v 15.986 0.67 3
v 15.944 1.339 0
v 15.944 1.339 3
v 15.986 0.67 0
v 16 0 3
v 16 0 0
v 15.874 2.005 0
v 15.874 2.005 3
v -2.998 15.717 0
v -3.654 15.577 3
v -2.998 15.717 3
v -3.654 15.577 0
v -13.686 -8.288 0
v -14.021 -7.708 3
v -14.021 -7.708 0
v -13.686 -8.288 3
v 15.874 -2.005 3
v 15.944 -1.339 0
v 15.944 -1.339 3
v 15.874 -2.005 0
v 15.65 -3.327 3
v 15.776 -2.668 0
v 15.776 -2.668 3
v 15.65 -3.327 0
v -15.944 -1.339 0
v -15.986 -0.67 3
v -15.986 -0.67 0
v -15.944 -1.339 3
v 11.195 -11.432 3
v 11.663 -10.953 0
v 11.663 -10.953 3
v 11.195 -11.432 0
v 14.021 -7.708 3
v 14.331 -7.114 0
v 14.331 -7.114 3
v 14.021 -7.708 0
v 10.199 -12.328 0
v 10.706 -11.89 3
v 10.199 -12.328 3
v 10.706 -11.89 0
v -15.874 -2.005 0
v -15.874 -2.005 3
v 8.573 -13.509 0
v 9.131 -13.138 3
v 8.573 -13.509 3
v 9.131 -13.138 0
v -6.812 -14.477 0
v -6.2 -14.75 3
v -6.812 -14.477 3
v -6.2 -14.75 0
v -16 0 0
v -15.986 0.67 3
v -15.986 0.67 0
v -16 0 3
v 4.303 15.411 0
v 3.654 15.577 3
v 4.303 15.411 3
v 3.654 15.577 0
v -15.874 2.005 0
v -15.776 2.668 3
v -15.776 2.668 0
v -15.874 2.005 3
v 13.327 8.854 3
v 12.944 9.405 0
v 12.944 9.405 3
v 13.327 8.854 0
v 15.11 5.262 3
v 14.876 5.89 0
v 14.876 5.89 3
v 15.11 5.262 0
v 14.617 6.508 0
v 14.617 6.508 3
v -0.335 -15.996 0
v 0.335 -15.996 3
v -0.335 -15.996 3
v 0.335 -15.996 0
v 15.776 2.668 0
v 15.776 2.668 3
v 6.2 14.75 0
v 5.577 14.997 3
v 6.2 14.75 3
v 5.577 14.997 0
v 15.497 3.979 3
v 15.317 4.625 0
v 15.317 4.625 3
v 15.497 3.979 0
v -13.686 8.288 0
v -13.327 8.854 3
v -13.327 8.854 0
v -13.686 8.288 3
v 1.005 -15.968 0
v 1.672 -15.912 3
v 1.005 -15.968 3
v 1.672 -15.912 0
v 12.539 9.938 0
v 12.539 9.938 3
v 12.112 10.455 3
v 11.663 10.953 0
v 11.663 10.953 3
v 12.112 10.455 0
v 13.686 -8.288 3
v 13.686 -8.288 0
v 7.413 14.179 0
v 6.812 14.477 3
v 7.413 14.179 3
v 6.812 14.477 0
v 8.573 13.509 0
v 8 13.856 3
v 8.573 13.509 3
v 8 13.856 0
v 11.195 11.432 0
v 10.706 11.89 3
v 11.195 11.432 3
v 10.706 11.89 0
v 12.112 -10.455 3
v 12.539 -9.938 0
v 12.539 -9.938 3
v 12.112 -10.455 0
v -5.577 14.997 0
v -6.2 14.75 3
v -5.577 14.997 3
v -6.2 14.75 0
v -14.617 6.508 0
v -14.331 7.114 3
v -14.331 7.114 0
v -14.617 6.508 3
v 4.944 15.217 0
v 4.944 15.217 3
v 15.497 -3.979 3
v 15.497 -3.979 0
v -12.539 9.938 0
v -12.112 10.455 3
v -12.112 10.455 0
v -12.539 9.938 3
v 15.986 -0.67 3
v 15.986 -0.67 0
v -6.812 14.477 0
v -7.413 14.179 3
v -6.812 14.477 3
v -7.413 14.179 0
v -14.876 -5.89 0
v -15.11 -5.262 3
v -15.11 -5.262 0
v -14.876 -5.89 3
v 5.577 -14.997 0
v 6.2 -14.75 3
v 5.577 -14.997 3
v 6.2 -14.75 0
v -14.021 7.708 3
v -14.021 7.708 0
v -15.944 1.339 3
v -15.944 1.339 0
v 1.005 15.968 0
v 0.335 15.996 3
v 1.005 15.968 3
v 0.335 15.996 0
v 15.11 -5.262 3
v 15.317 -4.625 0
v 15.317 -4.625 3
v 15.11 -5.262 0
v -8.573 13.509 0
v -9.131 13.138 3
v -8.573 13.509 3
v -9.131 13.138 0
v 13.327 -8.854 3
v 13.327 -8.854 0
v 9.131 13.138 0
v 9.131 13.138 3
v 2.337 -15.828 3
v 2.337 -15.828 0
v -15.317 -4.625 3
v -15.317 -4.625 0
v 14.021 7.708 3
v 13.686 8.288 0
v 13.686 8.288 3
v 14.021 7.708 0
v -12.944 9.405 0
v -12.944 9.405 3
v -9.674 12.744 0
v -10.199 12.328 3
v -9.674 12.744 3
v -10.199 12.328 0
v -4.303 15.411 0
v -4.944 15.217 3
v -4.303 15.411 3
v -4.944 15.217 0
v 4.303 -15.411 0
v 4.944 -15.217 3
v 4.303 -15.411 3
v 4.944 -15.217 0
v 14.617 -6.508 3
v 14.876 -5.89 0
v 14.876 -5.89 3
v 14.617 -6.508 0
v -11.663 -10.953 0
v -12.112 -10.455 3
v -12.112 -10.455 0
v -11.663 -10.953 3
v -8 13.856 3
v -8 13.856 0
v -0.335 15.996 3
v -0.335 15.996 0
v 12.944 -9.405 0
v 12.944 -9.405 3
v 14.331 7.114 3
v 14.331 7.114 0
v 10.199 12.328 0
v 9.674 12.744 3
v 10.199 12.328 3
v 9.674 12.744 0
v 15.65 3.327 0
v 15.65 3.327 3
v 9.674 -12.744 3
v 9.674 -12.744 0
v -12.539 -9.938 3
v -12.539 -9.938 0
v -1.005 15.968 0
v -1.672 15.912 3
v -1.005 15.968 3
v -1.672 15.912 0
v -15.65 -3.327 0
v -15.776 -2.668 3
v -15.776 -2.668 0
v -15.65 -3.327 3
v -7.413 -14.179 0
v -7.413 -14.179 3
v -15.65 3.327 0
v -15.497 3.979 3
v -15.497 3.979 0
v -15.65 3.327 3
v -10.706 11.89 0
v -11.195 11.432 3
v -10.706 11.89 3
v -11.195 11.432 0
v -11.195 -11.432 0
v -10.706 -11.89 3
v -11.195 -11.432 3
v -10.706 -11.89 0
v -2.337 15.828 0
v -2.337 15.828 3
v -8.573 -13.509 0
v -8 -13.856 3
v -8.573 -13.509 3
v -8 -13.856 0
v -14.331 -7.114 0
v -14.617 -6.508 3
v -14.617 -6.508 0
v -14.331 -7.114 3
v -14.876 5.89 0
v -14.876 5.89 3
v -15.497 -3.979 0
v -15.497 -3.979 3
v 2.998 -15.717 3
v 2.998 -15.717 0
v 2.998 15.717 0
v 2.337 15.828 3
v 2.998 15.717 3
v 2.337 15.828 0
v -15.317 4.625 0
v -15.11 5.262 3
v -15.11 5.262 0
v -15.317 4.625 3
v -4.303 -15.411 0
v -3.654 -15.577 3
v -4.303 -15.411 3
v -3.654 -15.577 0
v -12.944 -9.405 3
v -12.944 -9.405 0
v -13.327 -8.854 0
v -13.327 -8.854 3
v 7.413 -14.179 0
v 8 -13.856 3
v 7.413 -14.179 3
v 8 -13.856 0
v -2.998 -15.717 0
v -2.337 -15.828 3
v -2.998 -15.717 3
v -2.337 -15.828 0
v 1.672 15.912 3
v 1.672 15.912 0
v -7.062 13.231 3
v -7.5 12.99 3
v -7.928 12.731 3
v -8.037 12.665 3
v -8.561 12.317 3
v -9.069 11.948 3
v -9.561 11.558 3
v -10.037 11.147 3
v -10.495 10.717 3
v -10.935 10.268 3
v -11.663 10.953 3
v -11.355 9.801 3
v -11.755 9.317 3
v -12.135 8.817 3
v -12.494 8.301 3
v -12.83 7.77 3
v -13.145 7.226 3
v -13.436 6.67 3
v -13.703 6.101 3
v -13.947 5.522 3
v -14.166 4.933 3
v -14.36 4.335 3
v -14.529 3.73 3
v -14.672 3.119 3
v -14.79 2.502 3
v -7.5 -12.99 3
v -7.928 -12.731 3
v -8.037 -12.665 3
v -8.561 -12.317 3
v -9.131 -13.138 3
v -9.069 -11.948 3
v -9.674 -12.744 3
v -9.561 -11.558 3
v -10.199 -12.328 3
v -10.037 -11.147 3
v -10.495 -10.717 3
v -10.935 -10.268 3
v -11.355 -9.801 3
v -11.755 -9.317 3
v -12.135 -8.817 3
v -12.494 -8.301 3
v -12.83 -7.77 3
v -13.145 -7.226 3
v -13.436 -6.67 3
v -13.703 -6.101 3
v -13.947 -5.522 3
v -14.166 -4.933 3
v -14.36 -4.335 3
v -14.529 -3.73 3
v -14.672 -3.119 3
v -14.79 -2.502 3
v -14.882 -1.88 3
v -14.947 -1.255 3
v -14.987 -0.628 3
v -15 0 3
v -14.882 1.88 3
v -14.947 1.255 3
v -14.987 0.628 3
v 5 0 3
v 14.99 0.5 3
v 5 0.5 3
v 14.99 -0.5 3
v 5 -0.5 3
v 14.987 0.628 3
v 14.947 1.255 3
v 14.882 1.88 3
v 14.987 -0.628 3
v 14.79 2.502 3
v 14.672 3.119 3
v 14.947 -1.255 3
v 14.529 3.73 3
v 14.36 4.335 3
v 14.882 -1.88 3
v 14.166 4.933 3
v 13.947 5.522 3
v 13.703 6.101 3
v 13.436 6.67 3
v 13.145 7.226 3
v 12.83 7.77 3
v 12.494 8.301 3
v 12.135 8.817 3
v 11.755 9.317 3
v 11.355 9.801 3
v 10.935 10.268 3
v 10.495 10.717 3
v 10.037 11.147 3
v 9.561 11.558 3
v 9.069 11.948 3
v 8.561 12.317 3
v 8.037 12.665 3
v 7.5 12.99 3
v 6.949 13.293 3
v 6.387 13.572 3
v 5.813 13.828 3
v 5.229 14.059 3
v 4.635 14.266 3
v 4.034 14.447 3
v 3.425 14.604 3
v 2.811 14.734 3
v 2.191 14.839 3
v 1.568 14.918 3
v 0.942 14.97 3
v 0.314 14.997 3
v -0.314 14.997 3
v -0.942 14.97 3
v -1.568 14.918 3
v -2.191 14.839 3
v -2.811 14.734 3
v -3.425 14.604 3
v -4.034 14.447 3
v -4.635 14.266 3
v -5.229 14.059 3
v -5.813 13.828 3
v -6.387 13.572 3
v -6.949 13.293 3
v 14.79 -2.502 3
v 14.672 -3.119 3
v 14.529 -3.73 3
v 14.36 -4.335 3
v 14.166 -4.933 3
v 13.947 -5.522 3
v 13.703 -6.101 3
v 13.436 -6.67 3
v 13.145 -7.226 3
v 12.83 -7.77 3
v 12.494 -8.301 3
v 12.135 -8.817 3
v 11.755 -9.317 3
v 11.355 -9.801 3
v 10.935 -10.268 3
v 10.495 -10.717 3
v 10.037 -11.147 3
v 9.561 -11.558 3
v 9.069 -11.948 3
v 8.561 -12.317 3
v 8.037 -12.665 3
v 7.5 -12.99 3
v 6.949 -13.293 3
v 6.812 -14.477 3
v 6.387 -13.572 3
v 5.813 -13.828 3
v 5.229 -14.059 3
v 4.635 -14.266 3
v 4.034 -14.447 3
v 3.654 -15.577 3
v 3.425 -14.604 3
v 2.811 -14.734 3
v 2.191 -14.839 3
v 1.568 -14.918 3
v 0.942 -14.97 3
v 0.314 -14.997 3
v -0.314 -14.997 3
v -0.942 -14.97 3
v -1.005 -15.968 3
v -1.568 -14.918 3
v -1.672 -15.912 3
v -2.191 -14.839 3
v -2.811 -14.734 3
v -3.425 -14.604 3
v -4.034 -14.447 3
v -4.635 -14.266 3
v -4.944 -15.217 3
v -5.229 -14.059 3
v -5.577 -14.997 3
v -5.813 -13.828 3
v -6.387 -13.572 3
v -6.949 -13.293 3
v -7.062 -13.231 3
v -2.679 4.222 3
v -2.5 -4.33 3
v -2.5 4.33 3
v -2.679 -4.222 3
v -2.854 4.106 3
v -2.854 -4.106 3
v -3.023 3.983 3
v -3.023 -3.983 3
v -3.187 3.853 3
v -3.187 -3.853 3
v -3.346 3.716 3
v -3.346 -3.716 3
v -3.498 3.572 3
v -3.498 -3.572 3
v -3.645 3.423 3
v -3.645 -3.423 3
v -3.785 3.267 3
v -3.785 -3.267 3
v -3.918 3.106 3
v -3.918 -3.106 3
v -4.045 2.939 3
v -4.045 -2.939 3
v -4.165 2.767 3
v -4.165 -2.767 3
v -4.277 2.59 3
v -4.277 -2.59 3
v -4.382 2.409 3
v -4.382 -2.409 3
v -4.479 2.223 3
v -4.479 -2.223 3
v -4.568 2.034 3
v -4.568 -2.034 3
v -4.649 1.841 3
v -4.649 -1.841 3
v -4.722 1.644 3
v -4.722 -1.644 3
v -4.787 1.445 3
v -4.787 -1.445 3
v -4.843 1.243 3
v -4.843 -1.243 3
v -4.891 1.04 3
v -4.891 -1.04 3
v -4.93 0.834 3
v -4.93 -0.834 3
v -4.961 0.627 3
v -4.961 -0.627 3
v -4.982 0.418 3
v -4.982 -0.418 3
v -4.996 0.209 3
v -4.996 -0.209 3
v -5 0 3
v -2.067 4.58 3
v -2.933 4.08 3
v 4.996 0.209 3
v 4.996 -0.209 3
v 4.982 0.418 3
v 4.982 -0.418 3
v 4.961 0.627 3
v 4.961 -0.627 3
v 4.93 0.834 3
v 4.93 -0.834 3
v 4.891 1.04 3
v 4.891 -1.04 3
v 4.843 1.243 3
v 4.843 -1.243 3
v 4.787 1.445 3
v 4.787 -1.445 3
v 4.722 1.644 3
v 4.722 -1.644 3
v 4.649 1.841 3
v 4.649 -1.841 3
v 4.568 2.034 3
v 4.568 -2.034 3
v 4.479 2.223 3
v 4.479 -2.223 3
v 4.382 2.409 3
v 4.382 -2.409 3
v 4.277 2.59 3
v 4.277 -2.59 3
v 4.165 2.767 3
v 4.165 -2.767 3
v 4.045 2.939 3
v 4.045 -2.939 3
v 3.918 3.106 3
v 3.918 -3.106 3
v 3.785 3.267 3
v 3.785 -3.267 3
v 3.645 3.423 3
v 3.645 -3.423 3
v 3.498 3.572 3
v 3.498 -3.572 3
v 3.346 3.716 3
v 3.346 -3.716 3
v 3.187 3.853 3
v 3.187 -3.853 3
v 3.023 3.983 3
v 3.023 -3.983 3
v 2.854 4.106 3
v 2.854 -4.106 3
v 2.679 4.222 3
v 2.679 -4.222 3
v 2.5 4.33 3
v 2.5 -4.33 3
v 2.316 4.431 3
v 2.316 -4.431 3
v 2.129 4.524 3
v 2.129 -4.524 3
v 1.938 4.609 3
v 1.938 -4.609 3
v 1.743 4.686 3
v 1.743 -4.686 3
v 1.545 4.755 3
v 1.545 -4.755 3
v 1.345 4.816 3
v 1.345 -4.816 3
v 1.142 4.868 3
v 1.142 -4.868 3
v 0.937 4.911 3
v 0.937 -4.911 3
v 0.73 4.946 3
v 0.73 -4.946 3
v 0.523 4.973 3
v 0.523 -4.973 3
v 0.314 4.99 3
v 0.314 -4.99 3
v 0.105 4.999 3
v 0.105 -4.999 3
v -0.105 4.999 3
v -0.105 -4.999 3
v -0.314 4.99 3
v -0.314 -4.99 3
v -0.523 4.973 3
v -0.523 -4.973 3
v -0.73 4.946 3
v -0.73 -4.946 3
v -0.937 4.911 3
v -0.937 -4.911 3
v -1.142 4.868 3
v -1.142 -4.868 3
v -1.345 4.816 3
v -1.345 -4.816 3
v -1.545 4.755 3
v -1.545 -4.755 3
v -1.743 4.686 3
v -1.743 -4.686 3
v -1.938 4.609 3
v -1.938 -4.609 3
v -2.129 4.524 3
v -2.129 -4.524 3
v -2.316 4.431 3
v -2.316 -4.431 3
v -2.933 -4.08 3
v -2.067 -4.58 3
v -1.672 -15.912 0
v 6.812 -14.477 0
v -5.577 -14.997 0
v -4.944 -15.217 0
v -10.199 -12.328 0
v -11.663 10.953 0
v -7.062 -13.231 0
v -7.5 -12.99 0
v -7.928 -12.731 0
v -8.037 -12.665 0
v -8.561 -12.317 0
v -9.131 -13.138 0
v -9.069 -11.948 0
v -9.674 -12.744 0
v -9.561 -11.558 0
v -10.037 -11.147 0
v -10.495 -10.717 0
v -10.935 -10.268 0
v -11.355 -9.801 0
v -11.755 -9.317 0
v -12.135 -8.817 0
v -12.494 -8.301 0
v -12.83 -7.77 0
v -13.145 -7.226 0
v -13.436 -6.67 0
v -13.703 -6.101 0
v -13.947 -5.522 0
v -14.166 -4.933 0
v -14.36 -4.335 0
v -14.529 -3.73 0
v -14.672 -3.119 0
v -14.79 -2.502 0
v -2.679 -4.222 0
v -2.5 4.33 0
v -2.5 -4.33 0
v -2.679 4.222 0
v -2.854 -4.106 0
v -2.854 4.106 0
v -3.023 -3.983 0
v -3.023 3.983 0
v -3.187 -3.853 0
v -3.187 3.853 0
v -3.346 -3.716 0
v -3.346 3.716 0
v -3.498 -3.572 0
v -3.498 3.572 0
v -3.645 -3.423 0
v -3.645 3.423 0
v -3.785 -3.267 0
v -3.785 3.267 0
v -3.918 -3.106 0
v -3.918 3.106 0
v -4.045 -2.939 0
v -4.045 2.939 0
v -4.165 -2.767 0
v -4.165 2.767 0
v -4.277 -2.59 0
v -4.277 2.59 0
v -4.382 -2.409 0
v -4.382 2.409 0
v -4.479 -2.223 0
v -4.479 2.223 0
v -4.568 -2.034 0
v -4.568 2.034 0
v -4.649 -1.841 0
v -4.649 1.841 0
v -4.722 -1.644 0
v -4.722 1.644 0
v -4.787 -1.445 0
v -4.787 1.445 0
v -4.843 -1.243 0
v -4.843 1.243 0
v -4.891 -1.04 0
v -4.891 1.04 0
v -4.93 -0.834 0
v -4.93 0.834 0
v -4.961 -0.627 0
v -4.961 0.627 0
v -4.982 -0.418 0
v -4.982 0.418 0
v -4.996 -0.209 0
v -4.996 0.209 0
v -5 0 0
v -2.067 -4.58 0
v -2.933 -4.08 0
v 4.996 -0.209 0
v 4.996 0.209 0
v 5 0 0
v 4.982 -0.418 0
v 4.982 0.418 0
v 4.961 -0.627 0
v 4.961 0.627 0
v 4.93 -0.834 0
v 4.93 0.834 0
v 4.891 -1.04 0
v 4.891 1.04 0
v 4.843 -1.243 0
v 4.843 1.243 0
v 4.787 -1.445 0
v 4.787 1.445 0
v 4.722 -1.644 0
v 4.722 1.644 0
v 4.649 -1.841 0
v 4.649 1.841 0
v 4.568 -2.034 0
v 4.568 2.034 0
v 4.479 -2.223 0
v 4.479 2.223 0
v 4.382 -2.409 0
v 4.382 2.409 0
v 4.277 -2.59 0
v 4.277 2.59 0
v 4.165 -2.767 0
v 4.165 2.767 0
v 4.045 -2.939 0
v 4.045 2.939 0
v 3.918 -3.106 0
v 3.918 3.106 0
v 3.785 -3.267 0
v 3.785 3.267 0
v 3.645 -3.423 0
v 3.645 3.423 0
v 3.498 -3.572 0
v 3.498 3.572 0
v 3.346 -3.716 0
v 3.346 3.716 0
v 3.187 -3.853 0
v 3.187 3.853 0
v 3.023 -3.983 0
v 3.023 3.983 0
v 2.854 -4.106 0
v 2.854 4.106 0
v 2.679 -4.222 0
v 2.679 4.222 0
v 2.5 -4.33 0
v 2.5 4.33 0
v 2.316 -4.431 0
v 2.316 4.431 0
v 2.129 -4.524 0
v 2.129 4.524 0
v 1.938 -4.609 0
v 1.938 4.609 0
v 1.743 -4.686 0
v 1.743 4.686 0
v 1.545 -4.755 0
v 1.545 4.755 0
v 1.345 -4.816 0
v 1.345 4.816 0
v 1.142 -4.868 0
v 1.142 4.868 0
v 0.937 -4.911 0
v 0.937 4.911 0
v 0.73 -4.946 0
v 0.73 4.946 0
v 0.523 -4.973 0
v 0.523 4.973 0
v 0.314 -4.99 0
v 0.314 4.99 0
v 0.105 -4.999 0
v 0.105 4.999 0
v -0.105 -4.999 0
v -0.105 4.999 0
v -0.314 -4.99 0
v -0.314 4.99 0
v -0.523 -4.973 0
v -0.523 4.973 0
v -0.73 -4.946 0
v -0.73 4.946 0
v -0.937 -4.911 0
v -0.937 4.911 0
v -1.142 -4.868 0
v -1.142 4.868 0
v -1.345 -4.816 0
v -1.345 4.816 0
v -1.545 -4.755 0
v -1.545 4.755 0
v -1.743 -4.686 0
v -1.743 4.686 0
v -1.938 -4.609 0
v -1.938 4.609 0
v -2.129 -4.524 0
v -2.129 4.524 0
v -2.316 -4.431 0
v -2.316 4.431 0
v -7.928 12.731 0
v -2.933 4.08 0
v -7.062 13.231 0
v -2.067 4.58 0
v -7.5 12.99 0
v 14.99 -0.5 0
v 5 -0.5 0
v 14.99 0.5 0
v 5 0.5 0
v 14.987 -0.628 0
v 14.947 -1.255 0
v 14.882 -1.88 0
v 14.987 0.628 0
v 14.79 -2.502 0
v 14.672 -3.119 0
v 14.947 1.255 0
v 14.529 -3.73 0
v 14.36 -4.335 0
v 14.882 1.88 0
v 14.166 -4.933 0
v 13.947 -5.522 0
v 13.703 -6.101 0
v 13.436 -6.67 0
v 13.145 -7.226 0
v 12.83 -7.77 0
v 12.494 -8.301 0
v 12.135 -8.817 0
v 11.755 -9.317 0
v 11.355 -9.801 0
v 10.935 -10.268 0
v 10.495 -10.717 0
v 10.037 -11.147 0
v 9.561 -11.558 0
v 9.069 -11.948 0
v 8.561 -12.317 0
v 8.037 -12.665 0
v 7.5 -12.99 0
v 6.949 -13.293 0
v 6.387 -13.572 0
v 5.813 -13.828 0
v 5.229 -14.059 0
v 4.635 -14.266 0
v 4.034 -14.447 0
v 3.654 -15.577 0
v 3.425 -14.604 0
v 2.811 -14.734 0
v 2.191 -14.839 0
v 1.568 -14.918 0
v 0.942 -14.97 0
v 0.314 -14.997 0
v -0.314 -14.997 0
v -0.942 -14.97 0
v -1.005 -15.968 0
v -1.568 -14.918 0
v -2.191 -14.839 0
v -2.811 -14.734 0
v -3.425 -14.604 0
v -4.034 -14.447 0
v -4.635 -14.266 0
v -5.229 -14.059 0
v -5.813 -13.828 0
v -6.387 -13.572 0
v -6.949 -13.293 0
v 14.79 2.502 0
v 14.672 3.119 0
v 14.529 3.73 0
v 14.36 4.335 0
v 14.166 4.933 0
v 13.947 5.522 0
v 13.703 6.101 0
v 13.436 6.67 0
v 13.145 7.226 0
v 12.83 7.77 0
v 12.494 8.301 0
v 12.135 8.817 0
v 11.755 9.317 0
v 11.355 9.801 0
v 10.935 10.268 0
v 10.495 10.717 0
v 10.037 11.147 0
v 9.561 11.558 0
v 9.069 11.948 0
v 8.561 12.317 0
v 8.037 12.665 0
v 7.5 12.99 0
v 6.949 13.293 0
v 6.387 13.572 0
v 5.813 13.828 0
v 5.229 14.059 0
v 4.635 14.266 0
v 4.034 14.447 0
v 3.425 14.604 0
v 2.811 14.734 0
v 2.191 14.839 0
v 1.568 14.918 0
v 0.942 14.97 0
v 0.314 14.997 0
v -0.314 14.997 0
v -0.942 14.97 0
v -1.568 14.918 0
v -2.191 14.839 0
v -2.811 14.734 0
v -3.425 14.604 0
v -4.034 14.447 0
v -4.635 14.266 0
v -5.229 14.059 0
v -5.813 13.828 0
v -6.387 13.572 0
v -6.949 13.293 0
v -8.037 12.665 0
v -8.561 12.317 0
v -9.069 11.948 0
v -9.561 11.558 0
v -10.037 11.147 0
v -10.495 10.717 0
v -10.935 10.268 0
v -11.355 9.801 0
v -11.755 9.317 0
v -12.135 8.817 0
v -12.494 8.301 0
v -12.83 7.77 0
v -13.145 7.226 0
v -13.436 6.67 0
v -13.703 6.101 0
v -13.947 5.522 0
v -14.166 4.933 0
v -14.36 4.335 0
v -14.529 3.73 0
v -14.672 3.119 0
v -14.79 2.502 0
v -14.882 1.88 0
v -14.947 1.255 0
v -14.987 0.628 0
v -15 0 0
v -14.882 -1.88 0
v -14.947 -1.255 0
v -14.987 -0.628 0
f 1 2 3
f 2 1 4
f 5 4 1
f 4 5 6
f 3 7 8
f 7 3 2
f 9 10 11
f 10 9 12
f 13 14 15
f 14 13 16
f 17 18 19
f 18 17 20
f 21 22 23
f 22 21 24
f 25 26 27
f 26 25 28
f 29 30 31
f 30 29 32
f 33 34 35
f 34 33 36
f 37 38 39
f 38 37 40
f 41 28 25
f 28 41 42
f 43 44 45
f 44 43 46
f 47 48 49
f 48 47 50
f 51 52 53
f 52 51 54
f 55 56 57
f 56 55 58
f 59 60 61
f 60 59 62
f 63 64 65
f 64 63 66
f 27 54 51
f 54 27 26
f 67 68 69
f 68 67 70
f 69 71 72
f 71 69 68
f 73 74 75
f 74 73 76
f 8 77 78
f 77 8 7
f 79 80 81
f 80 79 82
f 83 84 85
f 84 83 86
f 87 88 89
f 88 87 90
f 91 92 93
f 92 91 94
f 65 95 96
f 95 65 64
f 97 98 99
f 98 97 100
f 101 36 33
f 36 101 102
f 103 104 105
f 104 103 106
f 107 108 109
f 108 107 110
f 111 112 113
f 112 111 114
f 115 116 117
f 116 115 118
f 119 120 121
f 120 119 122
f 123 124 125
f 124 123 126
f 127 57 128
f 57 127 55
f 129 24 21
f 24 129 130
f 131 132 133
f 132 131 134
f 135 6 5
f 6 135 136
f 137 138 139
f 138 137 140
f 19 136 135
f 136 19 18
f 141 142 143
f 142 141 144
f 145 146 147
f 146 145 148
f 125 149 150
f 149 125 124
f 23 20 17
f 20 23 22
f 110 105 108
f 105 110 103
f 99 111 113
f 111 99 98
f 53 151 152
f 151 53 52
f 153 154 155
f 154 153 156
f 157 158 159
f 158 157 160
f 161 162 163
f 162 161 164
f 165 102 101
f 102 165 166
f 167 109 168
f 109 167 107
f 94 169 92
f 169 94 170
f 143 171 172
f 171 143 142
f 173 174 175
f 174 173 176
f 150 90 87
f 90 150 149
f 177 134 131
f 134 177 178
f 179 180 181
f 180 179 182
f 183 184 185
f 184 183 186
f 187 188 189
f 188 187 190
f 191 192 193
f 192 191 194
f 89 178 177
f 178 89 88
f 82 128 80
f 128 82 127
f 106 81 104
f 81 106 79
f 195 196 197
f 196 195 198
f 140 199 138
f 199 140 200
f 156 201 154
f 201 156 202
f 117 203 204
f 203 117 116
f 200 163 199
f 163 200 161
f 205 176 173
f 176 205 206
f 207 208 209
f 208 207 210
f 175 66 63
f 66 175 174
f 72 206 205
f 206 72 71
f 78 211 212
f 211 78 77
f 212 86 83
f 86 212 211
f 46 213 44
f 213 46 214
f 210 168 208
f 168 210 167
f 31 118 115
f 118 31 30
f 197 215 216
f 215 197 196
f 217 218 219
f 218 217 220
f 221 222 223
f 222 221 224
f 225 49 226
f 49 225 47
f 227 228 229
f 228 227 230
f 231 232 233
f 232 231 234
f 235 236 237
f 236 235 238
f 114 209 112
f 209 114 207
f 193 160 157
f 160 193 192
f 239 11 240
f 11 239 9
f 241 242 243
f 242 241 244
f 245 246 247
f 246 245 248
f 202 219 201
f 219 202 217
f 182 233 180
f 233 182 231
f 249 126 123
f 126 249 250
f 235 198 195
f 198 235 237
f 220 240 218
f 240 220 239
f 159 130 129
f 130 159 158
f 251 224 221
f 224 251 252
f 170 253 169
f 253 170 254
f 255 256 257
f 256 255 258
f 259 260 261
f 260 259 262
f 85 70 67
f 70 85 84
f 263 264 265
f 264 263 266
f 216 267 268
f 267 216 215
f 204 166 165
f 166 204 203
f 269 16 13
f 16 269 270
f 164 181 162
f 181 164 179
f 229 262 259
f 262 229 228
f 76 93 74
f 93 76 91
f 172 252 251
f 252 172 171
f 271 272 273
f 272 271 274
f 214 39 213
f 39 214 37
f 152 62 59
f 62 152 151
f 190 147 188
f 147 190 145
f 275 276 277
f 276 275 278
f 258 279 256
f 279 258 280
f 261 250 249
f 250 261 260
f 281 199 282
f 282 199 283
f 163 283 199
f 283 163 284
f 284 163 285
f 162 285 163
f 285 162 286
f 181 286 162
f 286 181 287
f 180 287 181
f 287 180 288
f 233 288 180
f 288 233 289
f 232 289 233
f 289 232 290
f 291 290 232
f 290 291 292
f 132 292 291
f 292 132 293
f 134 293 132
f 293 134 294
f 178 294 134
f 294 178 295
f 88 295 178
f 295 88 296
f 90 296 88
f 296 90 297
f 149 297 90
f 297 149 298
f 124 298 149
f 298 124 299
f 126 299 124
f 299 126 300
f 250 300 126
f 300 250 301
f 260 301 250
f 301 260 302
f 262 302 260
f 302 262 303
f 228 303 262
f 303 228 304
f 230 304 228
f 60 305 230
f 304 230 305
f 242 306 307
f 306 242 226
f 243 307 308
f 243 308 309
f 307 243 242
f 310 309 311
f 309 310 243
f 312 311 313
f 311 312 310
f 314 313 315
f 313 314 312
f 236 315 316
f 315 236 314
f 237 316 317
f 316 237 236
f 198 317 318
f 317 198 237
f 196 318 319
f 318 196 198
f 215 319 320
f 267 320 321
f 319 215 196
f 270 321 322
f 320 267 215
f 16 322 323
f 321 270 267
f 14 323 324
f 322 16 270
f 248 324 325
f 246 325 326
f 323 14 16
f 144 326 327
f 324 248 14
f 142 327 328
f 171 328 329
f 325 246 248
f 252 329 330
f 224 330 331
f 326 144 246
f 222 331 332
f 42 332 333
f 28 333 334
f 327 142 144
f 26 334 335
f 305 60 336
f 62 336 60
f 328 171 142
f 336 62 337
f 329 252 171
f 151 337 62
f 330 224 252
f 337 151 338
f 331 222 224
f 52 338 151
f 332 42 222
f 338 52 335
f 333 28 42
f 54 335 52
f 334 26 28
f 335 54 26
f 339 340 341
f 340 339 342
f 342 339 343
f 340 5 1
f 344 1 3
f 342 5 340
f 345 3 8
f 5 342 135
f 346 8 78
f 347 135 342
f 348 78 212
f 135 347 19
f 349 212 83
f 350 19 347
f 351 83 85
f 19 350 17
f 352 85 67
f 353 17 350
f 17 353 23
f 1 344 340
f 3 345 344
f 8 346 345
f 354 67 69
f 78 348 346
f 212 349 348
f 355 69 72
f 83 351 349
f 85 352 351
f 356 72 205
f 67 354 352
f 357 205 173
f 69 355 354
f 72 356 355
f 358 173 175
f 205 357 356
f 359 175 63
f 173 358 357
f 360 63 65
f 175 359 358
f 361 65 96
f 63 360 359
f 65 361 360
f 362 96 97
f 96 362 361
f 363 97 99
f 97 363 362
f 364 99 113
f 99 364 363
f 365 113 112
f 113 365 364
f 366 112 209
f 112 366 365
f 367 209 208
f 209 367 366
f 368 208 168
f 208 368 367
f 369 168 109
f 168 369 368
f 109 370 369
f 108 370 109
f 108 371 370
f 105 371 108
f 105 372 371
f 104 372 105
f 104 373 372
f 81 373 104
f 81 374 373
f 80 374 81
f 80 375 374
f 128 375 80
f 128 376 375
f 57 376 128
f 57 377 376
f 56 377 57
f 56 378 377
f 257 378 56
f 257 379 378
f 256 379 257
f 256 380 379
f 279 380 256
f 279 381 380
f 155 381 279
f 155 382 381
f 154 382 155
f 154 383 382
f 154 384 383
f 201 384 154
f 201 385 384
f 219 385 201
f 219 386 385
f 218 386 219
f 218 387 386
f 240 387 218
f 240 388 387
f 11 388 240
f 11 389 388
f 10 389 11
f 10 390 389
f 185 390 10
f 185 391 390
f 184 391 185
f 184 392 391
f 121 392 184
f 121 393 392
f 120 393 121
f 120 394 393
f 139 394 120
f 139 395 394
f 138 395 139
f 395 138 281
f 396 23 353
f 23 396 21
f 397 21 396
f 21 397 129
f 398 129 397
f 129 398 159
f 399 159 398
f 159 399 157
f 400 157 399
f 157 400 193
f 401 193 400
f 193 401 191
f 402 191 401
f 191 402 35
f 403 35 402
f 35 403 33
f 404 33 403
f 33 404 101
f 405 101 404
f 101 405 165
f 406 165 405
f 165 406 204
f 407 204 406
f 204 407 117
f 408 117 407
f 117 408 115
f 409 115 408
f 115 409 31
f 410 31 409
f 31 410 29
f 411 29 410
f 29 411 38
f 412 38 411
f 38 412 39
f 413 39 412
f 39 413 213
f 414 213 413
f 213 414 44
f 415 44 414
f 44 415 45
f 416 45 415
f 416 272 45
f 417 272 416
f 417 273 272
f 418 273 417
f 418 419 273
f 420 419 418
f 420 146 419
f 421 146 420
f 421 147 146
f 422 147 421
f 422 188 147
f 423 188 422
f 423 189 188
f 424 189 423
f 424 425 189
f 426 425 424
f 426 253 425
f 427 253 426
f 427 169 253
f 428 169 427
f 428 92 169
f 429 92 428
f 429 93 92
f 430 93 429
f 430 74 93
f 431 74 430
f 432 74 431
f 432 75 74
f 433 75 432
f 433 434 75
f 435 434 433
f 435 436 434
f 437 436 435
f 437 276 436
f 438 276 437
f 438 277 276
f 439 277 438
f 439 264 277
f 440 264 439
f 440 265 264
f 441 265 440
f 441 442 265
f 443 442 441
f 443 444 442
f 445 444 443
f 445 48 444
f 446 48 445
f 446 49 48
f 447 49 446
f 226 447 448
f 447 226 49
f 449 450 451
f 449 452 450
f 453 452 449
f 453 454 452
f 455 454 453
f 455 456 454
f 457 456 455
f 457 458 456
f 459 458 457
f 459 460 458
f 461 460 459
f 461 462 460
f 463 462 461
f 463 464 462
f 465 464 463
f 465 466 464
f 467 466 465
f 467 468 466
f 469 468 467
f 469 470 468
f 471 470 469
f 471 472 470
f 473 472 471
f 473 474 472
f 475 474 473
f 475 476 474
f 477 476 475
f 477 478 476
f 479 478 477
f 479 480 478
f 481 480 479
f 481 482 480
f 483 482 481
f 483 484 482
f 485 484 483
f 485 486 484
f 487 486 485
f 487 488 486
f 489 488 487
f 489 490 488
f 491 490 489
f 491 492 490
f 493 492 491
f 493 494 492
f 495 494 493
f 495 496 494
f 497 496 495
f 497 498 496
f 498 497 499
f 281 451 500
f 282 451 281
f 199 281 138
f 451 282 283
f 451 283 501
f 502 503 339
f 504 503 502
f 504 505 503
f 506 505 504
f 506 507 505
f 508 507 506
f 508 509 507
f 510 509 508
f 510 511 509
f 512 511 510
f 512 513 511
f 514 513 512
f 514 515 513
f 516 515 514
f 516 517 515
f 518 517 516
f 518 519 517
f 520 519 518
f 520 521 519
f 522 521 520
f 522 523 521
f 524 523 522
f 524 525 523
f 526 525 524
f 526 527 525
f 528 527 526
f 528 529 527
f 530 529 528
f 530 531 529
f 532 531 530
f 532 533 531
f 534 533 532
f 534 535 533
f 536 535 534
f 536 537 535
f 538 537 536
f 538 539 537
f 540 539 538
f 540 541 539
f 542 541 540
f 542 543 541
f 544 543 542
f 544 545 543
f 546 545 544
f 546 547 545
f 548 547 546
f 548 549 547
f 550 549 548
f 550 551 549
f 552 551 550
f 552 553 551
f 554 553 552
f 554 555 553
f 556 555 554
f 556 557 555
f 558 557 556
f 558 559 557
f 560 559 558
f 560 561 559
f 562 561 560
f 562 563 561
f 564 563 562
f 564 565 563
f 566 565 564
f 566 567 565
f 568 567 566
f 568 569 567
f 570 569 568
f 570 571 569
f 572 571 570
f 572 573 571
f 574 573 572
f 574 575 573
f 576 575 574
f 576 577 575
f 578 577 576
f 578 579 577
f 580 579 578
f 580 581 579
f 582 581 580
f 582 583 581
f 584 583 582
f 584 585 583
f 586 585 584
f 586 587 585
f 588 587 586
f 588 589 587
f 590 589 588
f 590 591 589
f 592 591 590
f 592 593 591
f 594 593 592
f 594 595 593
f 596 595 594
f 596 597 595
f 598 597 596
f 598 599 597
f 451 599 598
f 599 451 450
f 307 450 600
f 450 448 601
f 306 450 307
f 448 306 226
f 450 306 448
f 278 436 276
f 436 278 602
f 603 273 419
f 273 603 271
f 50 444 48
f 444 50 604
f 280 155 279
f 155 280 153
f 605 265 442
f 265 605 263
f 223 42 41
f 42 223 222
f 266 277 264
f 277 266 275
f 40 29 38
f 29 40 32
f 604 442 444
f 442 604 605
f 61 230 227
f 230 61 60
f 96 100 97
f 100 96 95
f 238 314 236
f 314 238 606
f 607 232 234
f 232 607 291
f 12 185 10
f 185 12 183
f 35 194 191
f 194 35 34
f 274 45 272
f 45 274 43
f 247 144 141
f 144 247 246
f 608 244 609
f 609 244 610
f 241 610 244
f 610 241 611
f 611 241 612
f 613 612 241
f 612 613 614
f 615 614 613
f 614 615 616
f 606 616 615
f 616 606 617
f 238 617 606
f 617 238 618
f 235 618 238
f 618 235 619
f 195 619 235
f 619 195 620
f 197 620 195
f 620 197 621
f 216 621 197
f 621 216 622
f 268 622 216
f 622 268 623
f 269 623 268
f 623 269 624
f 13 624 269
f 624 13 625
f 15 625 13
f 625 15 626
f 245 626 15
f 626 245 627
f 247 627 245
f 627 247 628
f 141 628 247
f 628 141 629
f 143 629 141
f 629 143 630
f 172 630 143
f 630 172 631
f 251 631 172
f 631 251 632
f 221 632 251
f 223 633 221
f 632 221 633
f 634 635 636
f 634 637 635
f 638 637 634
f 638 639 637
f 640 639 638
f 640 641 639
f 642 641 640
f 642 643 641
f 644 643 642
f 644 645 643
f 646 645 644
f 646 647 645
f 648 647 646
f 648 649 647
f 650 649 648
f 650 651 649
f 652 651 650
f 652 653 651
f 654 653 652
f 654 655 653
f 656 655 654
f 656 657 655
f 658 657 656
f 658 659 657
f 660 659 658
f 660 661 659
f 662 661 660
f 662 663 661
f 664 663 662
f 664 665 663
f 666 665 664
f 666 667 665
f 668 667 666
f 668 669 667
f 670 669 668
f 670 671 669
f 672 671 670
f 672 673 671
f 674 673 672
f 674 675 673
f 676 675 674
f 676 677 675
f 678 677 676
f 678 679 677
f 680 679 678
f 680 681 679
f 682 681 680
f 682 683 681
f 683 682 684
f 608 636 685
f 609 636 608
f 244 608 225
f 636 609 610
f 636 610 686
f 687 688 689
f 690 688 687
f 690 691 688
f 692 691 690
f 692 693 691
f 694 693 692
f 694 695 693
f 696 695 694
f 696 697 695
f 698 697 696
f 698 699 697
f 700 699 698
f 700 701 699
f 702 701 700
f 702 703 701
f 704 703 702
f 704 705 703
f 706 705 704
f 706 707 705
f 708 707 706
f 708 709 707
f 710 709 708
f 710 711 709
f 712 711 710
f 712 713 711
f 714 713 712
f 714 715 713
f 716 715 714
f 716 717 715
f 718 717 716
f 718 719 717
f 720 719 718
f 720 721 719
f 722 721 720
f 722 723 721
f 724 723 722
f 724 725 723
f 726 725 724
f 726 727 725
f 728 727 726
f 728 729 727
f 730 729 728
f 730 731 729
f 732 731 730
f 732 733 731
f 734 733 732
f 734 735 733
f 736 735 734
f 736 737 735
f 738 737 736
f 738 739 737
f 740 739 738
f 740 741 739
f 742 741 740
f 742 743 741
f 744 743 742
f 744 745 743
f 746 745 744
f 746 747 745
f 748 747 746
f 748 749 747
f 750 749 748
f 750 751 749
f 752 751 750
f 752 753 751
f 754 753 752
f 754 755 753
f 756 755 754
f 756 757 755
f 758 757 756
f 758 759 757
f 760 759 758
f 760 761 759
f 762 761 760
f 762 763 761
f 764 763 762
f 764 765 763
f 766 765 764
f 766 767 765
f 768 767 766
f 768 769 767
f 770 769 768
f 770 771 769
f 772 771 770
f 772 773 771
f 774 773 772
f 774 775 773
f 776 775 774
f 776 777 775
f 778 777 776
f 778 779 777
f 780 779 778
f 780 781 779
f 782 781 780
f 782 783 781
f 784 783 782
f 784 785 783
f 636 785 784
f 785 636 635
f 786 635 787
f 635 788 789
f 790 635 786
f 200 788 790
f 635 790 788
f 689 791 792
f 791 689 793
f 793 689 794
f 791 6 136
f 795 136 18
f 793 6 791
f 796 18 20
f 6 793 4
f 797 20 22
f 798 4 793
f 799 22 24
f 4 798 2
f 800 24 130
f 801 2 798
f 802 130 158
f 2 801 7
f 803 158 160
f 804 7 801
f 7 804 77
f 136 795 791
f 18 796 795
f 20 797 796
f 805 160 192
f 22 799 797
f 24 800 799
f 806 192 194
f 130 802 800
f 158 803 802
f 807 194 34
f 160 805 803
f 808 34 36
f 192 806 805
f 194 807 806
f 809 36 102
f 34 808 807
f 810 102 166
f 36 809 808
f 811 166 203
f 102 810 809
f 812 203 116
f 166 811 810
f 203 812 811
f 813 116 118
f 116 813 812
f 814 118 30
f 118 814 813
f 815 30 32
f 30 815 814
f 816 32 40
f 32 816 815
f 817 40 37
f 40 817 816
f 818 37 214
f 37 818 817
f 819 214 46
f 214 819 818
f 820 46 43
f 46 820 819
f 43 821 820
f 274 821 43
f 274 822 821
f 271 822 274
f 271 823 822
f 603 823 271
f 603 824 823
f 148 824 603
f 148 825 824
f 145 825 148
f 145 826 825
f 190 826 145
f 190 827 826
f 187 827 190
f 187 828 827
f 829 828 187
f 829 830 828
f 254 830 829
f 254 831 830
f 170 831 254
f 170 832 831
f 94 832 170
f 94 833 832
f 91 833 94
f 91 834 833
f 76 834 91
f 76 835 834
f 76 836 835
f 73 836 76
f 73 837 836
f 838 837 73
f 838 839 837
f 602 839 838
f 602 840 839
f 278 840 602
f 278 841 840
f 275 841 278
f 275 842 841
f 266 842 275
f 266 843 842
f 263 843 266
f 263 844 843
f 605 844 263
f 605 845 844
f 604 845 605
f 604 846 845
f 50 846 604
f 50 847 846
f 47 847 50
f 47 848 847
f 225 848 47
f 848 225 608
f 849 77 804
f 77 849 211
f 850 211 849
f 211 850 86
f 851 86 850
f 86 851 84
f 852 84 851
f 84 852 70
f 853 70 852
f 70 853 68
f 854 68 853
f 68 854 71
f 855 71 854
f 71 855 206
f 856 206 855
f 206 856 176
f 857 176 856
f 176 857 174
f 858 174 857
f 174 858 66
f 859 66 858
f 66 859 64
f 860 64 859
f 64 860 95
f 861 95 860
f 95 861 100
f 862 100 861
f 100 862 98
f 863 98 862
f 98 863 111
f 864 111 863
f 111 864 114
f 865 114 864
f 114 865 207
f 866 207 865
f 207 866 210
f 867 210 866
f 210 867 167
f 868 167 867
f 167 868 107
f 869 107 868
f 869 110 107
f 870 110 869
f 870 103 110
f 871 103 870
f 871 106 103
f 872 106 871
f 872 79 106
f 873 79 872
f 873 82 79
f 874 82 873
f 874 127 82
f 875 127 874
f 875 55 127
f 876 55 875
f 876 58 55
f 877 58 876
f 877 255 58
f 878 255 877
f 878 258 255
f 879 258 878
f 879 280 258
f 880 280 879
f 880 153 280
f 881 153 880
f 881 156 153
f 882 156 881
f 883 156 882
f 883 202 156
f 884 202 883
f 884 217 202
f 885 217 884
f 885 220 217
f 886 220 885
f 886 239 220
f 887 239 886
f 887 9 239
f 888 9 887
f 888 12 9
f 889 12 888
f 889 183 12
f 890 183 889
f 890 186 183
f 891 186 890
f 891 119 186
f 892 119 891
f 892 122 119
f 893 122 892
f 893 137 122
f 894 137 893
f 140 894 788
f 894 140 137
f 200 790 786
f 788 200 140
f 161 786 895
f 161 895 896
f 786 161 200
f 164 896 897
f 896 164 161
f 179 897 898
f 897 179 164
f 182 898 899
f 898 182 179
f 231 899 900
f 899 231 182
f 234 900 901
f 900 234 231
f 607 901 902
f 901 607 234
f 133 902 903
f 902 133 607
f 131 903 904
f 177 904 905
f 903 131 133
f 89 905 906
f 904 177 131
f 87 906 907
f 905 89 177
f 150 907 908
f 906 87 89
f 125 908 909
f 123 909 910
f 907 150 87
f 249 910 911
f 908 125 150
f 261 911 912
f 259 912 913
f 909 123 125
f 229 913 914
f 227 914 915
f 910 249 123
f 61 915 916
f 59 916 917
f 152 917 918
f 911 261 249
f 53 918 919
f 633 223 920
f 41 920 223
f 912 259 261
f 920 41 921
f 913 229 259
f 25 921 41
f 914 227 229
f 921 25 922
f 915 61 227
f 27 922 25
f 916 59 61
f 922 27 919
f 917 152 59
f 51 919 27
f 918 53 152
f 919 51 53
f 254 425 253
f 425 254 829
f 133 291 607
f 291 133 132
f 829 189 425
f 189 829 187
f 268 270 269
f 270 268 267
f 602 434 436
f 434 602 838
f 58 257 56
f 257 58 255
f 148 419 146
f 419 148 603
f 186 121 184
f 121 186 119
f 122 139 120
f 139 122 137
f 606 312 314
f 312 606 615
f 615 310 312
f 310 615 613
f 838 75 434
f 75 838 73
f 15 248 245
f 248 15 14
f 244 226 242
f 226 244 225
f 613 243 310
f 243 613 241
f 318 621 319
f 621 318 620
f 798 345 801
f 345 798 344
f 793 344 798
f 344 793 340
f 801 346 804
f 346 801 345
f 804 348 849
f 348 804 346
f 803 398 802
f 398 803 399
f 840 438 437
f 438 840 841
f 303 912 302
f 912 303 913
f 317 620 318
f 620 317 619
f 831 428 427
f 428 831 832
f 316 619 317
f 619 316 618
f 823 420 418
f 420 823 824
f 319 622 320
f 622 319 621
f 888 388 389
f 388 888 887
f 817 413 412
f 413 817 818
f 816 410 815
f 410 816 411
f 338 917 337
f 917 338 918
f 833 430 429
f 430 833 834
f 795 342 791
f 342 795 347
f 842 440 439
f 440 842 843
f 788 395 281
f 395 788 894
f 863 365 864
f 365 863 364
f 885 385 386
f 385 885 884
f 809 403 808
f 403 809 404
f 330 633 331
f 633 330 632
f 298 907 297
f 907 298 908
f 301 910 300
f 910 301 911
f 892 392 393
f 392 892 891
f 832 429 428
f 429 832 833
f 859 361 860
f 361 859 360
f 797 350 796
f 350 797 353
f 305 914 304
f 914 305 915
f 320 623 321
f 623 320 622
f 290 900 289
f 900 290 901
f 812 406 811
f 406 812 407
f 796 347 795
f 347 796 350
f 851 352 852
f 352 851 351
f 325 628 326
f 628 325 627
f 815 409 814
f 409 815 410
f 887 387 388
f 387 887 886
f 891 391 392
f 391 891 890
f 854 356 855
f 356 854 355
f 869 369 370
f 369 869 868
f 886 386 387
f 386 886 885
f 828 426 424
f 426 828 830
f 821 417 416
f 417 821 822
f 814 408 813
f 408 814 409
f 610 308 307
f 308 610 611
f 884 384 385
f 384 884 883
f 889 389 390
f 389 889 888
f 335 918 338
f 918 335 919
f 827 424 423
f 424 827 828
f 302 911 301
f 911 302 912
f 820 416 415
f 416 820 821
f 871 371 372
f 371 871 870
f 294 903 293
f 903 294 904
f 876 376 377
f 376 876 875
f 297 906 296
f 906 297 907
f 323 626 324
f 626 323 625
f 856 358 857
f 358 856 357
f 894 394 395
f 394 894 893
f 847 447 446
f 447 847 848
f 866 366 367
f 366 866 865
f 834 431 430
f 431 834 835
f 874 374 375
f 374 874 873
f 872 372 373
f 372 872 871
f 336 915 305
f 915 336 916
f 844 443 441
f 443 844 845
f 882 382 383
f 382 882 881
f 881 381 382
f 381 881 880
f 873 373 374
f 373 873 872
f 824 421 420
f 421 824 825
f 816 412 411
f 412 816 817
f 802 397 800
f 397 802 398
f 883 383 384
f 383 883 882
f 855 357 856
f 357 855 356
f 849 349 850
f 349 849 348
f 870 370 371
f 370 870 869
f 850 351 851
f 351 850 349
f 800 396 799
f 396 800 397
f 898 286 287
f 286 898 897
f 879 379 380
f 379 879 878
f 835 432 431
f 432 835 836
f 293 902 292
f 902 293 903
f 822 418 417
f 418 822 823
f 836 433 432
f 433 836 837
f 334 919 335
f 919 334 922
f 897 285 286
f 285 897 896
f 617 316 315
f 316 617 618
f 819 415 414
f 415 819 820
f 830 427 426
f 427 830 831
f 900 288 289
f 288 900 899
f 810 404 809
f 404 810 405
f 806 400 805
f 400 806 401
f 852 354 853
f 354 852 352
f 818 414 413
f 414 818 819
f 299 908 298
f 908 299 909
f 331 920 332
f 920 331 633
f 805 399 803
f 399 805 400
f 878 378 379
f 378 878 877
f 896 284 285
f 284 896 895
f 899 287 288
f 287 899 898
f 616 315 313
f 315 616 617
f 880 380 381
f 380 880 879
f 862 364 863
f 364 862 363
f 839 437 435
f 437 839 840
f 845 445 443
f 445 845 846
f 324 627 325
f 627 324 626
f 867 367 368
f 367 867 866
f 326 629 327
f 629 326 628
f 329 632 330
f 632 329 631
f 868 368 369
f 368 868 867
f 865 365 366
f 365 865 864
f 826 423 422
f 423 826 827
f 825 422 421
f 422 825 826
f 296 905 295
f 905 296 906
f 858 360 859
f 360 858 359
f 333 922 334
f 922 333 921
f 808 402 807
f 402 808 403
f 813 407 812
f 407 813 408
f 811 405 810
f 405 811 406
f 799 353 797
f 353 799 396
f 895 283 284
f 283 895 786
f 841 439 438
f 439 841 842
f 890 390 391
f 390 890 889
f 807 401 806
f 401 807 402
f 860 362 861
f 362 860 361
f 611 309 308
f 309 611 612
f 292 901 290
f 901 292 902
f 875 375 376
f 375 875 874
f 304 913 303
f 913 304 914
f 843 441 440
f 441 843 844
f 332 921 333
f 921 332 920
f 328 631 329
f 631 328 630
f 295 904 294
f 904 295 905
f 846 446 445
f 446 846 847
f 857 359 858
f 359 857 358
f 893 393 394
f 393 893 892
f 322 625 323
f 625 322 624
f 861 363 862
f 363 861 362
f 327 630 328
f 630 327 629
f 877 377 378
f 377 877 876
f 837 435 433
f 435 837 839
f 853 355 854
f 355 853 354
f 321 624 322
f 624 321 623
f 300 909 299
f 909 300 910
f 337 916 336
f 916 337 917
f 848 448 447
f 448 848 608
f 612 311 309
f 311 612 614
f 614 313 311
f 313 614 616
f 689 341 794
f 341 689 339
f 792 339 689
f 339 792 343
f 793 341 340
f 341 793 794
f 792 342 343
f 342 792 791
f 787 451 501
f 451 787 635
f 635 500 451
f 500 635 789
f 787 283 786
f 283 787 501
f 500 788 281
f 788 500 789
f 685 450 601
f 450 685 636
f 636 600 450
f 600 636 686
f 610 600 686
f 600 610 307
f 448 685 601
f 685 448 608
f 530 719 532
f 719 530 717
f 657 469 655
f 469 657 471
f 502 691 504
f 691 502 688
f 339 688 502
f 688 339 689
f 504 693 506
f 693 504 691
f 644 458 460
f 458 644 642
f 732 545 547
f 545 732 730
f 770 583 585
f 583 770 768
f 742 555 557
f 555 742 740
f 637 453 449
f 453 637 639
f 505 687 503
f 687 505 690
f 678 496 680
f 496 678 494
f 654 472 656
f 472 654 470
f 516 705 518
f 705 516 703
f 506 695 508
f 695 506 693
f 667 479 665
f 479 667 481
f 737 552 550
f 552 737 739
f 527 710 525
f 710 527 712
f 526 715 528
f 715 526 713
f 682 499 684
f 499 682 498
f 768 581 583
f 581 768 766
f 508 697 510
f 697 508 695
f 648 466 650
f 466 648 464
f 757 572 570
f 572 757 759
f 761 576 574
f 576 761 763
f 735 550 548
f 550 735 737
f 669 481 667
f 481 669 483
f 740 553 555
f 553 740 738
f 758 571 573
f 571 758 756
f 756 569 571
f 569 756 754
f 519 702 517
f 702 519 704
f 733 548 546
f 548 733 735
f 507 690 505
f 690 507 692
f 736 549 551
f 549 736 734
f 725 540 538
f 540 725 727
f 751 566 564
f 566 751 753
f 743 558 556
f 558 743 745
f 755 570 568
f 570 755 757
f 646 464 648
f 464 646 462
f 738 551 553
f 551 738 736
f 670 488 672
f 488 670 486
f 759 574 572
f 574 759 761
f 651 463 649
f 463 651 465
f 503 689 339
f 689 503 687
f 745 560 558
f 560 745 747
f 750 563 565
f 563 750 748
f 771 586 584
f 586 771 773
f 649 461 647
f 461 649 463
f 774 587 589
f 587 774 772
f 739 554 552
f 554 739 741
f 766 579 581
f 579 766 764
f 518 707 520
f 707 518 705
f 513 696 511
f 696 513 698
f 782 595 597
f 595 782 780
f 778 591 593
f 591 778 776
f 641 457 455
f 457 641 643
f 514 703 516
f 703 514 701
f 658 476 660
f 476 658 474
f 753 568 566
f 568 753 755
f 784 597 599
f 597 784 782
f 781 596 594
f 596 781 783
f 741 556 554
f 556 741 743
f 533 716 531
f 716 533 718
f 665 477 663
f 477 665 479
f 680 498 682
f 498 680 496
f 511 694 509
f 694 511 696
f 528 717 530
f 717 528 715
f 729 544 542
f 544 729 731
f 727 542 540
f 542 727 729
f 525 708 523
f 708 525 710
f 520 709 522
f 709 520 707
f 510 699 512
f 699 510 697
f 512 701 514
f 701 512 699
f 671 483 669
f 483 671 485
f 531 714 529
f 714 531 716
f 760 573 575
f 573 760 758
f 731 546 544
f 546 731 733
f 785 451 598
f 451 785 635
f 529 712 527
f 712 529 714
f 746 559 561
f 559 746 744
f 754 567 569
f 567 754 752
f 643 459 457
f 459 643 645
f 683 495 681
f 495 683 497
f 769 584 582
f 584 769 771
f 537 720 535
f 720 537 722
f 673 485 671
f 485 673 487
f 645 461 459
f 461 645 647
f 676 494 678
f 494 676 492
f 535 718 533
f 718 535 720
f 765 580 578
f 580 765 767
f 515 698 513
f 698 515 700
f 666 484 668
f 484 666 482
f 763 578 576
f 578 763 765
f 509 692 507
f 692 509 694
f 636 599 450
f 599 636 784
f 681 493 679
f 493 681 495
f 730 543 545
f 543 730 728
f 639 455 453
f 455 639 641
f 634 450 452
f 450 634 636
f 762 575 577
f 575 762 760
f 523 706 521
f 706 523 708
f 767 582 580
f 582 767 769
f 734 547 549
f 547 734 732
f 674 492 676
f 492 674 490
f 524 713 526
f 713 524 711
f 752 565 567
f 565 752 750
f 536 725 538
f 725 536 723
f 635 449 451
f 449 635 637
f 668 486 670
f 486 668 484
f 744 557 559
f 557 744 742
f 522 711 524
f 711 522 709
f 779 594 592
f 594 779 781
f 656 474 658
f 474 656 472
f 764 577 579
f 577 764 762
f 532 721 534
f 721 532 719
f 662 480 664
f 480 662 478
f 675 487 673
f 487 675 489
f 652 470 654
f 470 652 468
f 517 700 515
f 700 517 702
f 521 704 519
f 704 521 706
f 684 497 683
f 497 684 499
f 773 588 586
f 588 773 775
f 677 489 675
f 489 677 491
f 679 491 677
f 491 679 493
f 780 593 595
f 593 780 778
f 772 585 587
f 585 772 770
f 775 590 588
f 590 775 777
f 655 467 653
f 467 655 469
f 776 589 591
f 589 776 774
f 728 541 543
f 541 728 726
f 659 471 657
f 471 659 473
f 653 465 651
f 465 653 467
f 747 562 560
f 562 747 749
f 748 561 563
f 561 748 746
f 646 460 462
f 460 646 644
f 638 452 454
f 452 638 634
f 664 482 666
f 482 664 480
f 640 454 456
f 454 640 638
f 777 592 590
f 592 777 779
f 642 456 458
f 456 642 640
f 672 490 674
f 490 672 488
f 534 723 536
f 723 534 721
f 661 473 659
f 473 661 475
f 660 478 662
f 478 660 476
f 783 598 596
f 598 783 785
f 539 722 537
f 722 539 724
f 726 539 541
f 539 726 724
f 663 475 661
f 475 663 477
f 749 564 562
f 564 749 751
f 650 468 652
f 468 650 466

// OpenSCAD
/* 
                            Dark Field Filters v1.0
                    
   Dark Field Filters v1.0

An open source filter for a costume dark field hat can be adapted to any compound microscope.

This 3D file is designed to be the first optical filter for contrast illumination Technics for microscopy enthusiast and professionals.
     
Source :https://github.com/Usuy-Leon/DIY_Dark-Field-Filters

This project is an Open Source project,
by Usuy D. Leon, 2025.03.26
Microscopist, National University of Colombia, Bogota DC,

    */

// // // // // // // // // // // // // // // // // // // // // // // // // //
/*                        - User Parameters -                             */
 
height = 3;         // Total height of the filter
outer_dia = 32;     // Outer diameter of the main structure
inner_dia = 10;     // Diameter of the light-blocking center cylinder
border_thickness = 2; // Thickness of the outer border
$fn = 150;          // Number of facets "resolution"

/*                      - Arms Characteristics -                          */

number_arms = 3;    // less arms will give you more information and light
arm_thickness = 1;  // Thickness of the connecting arms


// // // // // // // // // // // // // // // // // // // // // // // // // // 
/*                            - Filter Caracteristics -                    */

// Calculate the border ring
border_inner_dia = outer_dia - border_thickness;

// Create the outer border ring
difference() {
    cylinder(h=height, d=outer_dia);
    cylinder(h=2+height, d=border_inner_dia);
}

// Create the central light-blocking cylinder
cylinder(h=height, d=inner_dia);

for (i = [0:number_arms-1]) {
    rotate([0, 0, i*(360/number_arms)]) {
        translate([inner_dia/2, -arm_thickness/2, 0]) {
            cube([
                (border_inner_dia/2 - inner_dia/2), // Arm length
                arm_thickness,
                height
            ]);
        }
    }
}
